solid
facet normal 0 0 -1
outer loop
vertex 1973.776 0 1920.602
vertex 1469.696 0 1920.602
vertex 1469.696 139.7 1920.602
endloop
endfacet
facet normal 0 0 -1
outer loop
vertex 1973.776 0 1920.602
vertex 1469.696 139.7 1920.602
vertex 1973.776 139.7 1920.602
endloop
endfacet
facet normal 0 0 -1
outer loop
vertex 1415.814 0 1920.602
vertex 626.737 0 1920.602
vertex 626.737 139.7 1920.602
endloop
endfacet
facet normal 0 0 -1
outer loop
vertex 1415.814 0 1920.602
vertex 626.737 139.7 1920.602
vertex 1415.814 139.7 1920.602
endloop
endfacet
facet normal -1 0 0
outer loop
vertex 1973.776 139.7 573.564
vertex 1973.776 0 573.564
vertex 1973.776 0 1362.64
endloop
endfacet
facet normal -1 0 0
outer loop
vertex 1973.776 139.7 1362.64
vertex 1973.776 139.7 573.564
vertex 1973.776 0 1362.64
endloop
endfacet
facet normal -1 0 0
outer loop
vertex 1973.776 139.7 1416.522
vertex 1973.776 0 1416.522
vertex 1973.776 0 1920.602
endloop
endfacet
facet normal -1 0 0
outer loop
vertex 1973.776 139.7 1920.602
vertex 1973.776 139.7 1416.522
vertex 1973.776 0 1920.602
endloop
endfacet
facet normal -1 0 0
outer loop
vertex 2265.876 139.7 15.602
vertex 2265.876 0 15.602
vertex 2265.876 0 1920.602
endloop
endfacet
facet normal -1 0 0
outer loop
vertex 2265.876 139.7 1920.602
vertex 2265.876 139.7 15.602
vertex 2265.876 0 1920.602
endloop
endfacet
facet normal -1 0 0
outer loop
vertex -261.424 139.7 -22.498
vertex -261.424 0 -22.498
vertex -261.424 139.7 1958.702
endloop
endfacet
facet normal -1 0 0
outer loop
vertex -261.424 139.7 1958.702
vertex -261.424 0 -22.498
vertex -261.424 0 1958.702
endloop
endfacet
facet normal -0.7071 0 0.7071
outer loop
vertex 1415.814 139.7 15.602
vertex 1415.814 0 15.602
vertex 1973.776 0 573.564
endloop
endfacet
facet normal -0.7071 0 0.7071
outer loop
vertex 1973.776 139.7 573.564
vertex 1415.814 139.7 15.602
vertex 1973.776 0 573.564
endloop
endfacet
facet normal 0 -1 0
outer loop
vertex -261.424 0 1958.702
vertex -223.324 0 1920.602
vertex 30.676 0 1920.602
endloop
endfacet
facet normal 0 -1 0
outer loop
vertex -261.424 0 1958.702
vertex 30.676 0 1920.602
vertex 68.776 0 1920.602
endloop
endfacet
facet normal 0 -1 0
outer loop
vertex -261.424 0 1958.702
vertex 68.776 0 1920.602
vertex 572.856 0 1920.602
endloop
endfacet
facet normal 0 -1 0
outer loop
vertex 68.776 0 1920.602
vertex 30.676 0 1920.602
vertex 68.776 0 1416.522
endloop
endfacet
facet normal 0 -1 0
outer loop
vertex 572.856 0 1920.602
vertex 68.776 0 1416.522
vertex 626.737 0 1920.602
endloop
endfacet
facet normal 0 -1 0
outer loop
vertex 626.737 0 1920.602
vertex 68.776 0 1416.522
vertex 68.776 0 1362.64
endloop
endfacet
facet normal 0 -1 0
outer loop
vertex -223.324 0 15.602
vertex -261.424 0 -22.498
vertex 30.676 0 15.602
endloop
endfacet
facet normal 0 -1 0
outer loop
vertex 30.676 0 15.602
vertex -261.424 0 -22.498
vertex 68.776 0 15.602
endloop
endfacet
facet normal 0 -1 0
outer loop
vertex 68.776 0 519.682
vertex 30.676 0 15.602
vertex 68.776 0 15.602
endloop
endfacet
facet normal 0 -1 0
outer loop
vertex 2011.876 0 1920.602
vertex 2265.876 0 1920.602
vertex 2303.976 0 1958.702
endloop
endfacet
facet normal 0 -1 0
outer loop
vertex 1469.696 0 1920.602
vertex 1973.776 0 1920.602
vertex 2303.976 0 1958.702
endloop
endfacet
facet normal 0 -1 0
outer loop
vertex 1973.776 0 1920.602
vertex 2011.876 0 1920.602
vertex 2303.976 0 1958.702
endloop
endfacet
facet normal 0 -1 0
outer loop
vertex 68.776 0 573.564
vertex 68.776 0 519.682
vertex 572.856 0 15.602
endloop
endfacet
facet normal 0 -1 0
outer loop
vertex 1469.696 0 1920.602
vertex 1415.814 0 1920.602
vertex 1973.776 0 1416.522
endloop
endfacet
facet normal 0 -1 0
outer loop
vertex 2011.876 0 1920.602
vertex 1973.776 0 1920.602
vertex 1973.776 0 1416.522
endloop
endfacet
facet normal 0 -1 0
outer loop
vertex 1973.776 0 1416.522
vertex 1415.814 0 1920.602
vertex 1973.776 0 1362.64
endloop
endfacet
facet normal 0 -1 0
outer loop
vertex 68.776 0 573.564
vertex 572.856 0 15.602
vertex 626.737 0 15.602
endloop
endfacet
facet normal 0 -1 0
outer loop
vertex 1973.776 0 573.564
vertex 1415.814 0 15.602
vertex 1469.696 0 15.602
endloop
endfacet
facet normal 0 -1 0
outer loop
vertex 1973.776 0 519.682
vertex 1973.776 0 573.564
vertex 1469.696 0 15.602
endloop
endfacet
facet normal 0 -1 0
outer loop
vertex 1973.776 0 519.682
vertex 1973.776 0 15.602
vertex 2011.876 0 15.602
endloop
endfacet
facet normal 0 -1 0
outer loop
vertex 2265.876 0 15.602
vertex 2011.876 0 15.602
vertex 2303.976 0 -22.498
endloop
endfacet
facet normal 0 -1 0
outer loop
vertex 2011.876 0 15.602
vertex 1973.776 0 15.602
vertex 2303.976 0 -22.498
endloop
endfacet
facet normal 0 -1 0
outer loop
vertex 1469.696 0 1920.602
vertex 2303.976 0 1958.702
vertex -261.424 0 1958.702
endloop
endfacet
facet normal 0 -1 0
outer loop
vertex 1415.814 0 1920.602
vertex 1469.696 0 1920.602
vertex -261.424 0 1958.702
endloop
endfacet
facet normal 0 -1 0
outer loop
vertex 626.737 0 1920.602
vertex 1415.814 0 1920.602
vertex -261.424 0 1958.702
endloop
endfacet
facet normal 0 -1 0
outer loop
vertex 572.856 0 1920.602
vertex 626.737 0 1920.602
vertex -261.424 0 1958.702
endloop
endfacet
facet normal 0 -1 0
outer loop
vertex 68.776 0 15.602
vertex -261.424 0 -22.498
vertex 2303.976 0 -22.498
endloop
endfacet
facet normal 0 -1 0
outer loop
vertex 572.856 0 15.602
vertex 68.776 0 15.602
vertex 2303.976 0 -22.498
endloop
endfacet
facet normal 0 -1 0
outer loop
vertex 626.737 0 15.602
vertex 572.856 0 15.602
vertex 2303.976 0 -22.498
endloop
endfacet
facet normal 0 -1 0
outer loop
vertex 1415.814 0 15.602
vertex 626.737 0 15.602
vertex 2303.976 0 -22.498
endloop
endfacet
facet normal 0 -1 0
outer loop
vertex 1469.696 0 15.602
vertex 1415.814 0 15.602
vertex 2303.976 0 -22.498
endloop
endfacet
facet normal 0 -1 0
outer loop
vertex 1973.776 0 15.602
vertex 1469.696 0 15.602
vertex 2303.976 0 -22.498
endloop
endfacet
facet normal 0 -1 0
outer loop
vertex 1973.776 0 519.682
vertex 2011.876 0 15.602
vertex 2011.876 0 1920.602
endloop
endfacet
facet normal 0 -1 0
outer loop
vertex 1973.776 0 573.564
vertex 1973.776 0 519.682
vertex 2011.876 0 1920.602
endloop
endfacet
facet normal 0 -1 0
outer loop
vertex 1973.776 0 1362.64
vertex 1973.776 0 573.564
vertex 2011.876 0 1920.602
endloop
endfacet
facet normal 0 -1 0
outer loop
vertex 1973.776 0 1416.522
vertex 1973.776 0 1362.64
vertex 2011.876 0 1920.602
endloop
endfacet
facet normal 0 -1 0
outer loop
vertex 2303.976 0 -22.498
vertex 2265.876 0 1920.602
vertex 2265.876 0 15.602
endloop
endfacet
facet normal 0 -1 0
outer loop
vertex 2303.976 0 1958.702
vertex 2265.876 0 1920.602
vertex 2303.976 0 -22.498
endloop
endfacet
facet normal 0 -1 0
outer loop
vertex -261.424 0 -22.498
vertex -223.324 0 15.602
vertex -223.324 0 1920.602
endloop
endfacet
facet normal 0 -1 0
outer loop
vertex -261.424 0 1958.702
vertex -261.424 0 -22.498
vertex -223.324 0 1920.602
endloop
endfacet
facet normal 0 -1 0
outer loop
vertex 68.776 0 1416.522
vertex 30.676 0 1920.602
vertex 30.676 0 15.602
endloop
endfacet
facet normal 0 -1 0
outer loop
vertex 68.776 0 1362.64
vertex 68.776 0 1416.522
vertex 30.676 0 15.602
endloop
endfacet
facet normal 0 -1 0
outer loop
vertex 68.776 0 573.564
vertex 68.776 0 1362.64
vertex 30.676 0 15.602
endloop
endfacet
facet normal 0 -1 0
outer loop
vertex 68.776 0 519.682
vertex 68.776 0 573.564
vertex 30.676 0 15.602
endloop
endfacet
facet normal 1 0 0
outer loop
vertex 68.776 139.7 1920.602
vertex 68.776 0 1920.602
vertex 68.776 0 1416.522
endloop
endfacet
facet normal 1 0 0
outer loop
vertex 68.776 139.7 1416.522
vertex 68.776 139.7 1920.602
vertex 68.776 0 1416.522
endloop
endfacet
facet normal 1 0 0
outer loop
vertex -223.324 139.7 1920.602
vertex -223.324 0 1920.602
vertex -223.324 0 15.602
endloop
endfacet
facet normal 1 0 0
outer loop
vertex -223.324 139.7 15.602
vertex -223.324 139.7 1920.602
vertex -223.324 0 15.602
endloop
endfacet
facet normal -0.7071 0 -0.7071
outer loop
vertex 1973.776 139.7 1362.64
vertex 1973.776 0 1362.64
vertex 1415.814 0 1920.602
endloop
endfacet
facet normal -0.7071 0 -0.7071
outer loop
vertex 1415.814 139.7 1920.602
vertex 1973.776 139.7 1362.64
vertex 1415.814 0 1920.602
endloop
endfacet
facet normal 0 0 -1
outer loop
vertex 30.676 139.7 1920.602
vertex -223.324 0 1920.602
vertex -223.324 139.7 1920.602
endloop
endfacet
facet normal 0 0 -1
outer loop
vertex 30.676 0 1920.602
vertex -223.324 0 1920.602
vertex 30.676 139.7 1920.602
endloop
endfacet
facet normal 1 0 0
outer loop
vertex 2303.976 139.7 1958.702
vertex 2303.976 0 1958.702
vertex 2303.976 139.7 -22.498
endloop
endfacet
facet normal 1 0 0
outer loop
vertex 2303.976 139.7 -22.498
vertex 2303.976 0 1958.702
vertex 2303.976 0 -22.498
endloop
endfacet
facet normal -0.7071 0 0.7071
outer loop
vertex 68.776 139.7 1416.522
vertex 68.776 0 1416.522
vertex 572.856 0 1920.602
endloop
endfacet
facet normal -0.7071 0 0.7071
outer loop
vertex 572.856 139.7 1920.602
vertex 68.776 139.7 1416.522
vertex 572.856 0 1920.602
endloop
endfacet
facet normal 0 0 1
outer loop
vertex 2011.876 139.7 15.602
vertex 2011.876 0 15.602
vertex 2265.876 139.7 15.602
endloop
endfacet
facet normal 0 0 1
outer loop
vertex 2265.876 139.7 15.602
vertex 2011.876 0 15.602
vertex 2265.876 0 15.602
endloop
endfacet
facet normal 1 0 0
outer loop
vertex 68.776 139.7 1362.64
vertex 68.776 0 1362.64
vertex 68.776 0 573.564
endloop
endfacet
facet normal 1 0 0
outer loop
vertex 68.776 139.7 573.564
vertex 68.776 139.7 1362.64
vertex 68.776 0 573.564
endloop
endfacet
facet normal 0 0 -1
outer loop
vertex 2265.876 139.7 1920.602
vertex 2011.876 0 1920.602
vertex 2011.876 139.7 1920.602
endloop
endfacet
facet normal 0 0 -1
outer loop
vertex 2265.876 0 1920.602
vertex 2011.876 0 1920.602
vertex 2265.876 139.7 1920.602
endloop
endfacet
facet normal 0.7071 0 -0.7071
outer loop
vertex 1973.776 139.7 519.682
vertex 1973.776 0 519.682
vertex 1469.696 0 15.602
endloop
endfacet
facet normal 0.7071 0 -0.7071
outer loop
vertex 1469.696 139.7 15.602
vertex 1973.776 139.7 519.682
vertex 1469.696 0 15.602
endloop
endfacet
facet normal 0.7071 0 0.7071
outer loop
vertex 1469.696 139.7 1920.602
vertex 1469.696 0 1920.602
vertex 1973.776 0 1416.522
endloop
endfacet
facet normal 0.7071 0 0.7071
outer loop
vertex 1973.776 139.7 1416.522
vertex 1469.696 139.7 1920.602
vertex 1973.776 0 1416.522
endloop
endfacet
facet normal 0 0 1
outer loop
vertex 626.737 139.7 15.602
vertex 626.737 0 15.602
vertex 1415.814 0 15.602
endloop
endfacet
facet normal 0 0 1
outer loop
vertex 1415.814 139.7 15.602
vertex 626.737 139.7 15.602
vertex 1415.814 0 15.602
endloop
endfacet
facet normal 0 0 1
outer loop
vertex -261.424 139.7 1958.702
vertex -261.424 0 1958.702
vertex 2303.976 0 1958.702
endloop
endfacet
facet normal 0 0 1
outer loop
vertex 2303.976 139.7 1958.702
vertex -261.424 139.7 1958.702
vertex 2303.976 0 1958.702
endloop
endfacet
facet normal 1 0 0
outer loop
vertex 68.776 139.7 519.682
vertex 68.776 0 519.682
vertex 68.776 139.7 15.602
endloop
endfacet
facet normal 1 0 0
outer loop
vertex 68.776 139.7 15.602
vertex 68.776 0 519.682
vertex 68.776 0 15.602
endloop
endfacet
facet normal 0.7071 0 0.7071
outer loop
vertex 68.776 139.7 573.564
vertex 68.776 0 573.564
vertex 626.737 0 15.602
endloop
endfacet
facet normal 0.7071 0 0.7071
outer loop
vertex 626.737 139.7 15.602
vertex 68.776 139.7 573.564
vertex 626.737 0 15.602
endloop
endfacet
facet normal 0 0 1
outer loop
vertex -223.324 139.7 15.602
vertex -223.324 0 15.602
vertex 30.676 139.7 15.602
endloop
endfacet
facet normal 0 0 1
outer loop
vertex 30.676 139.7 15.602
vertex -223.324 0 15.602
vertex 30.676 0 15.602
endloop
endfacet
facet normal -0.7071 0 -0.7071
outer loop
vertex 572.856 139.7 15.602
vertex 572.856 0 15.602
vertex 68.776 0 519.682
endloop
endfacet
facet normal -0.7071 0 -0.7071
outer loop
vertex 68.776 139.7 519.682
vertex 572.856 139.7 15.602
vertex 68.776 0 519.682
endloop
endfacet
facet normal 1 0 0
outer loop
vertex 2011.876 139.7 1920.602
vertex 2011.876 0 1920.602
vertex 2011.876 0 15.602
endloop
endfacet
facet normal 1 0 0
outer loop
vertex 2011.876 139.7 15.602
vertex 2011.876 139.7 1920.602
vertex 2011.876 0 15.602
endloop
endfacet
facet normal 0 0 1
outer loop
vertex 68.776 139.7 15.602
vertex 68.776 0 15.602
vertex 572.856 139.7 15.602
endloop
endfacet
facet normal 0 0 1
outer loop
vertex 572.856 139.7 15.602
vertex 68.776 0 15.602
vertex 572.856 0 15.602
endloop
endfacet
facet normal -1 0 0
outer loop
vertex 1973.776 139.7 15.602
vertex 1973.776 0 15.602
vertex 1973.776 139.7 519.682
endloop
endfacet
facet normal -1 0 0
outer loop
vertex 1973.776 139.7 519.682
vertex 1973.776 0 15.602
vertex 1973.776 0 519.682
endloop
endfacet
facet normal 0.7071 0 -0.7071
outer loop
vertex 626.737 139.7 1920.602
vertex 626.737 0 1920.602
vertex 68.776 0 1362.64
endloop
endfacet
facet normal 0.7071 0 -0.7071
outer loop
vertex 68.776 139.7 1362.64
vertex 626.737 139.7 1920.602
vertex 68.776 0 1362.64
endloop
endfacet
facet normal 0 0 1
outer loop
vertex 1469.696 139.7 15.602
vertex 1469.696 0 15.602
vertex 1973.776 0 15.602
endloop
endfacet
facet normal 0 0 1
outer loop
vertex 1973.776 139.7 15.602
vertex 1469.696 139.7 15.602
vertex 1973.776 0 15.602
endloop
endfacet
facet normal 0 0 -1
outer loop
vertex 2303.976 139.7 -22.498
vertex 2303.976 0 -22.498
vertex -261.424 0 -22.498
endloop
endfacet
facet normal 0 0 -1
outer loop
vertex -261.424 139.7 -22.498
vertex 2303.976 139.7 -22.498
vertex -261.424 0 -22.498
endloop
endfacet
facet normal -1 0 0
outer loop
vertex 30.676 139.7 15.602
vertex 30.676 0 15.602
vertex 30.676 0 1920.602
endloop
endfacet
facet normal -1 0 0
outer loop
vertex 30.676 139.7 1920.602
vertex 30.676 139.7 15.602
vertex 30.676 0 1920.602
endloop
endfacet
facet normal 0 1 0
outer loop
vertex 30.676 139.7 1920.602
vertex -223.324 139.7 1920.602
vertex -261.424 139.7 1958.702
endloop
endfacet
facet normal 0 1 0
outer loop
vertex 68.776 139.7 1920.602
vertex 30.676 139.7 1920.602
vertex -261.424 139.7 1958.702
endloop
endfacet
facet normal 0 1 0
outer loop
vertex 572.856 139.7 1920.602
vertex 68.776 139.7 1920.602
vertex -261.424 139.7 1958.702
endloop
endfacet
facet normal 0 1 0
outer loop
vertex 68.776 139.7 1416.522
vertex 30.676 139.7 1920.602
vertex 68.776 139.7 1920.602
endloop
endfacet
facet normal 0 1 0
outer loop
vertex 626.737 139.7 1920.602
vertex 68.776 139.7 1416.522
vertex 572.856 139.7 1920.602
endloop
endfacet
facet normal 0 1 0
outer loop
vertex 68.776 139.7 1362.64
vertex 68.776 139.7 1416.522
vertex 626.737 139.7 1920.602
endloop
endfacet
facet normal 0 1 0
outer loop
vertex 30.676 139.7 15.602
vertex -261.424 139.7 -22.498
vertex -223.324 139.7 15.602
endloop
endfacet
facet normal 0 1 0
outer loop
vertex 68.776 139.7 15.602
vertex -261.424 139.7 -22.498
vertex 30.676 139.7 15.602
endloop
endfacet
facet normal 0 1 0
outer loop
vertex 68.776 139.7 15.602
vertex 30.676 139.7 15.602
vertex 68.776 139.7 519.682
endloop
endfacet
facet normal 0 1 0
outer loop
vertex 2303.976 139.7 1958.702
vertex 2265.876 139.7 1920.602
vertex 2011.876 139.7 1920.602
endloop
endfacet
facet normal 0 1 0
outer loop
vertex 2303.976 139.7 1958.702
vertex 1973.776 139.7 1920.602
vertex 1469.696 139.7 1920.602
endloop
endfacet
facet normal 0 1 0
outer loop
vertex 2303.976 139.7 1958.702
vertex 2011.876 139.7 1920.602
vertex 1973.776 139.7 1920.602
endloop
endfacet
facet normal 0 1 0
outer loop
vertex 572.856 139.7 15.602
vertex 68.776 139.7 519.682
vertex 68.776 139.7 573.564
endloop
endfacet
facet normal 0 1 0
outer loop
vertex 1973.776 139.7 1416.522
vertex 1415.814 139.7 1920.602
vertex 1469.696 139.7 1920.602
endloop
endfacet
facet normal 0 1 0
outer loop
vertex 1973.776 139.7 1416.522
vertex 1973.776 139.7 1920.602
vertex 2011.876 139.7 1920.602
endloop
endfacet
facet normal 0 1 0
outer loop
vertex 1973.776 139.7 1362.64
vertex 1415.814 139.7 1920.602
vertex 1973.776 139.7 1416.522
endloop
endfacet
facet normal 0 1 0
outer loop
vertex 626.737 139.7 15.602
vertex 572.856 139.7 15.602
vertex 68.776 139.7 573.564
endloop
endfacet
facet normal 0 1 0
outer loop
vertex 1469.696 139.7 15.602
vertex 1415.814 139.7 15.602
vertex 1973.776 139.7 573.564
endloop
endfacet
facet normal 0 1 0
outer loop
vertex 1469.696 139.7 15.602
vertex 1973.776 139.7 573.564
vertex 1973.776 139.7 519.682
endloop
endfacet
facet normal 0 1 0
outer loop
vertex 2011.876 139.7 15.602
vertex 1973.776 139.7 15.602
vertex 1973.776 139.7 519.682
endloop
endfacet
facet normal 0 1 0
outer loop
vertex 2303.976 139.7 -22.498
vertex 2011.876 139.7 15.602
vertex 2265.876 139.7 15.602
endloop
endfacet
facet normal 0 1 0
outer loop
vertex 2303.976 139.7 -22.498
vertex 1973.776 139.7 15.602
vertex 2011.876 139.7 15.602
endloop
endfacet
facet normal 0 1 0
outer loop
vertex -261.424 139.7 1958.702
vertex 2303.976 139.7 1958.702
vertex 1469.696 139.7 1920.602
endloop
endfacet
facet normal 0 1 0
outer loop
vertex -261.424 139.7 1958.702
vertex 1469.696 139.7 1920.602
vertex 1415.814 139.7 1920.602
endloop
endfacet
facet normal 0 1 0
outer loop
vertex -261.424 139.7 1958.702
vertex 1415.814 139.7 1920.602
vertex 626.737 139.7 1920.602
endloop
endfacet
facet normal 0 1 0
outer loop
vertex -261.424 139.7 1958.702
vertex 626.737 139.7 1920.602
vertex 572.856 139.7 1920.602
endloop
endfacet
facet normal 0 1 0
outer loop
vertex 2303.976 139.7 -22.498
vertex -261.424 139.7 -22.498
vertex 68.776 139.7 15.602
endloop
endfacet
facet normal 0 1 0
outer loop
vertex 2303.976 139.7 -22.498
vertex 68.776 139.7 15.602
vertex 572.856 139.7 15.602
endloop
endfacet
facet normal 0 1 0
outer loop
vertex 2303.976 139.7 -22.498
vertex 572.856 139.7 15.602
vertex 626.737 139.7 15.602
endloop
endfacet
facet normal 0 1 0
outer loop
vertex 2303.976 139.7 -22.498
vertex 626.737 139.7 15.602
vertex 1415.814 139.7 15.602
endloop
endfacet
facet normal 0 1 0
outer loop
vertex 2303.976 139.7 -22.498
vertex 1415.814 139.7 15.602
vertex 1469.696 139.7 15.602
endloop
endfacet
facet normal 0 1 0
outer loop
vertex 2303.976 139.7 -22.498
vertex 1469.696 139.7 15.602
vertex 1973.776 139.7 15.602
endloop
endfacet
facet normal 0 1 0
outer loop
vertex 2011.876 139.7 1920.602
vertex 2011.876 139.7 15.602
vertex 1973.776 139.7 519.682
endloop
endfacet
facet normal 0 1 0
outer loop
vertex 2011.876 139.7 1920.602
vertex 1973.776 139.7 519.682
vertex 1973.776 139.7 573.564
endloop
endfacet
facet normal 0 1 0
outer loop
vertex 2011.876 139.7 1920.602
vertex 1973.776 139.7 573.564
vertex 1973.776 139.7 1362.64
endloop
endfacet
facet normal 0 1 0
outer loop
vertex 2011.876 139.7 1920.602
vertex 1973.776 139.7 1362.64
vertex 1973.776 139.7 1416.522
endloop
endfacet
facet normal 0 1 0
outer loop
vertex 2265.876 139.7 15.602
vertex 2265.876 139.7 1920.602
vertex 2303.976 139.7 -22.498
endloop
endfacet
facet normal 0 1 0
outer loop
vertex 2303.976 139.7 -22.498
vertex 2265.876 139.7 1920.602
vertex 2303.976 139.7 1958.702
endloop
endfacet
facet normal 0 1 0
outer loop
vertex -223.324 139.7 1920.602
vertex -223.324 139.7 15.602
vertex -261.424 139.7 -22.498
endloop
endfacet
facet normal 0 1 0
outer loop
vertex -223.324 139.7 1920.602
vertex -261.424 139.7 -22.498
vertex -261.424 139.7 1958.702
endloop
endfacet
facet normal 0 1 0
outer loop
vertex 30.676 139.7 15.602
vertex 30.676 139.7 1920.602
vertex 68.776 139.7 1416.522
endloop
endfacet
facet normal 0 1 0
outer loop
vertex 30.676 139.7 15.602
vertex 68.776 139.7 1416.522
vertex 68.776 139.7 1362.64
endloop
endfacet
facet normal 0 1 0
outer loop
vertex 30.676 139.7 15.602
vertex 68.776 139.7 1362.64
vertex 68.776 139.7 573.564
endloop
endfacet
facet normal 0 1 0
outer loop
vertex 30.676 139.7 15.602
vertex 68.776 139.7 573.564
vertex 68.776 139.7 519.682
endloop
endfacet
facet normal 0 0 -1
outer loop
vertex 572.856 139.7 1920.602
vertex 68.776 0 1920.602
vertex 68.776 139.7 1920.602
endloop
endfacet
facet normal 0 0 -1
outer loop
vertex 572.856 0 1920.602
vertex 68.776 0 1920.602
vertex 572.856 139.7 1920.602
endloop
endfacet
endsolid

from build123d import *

# Parameters (mm, degrees)
SKETCH1_W           = 2565.4
SKETCH1_H           = 1981.2
SKETCH1_W_2         = 254
SKETCH1_H_2         = 1905
BOSS_EXTRUDE1_DEPTH = 139.7


with BuildPart() as part:
    # Sketch1 → Boss-Extrude1 (new body)
    with BuildSketch(Plane(origin=(0, 0, 0), x_dir=(1, 0, 0), z_dir=(0, 1, 0))):
        with Locations((1021.275844638, -968.102055566)):
            Rectangle(SKETCH1_W, SKETCH1_H)
        with Locations((2138.875844638, -968.102055566)):
            Rectangle(SKETCH1_W_2, SKETCH1_H_2, mode=Mode.SUBTRACT)
        Polygon((1469.695799525, -15.602055566), (1973.775844638, -15.602055566), (1973.775844638, -519.682100679), align=None, mode=Mode.SUBTRACT)
        Polygon((626.737426478, -15.602055566), (1415.814262798, -15.602055566), (1973.775844638, -573.563637405), (1973.775844638, -1362.640473726), (1415.814262798, -1920.602055566), (626.737426478, -1920.602055566), (68.775844638, -1362.640473726), (68.775844638, -573.563637405), align=None, mode=Mode.SUBTRACT)
        Polygon((68.775844638, -15.602055566), (572.855889751, -15.602055566), (68.775844638, -519.682100679), align=None, mode=Mode.SUBTRACT)
        with Locations((-96.324155362, -968.102055566)):
            Rectangle(SKETCH1_W_2, SKETCH1_H_2, mode=Mode.SUBTRACT)
        Polygon((1973.775844638, -1416.522010452), (1973.775844638, -1920.602055566), (1469.695799525, -1920.602055566), align=None, mode=Mode.SUBTRACT)
        Polygon((68.775844638, -1920.602055566), (68.775844638, -1416.522010452), (572.855889751, -1920.602055566), align=None, mode=Mode.SUBTRACT)
    extrude(amount=BOSS_EXTRUDE1_DEPTH)


solid = part.part
